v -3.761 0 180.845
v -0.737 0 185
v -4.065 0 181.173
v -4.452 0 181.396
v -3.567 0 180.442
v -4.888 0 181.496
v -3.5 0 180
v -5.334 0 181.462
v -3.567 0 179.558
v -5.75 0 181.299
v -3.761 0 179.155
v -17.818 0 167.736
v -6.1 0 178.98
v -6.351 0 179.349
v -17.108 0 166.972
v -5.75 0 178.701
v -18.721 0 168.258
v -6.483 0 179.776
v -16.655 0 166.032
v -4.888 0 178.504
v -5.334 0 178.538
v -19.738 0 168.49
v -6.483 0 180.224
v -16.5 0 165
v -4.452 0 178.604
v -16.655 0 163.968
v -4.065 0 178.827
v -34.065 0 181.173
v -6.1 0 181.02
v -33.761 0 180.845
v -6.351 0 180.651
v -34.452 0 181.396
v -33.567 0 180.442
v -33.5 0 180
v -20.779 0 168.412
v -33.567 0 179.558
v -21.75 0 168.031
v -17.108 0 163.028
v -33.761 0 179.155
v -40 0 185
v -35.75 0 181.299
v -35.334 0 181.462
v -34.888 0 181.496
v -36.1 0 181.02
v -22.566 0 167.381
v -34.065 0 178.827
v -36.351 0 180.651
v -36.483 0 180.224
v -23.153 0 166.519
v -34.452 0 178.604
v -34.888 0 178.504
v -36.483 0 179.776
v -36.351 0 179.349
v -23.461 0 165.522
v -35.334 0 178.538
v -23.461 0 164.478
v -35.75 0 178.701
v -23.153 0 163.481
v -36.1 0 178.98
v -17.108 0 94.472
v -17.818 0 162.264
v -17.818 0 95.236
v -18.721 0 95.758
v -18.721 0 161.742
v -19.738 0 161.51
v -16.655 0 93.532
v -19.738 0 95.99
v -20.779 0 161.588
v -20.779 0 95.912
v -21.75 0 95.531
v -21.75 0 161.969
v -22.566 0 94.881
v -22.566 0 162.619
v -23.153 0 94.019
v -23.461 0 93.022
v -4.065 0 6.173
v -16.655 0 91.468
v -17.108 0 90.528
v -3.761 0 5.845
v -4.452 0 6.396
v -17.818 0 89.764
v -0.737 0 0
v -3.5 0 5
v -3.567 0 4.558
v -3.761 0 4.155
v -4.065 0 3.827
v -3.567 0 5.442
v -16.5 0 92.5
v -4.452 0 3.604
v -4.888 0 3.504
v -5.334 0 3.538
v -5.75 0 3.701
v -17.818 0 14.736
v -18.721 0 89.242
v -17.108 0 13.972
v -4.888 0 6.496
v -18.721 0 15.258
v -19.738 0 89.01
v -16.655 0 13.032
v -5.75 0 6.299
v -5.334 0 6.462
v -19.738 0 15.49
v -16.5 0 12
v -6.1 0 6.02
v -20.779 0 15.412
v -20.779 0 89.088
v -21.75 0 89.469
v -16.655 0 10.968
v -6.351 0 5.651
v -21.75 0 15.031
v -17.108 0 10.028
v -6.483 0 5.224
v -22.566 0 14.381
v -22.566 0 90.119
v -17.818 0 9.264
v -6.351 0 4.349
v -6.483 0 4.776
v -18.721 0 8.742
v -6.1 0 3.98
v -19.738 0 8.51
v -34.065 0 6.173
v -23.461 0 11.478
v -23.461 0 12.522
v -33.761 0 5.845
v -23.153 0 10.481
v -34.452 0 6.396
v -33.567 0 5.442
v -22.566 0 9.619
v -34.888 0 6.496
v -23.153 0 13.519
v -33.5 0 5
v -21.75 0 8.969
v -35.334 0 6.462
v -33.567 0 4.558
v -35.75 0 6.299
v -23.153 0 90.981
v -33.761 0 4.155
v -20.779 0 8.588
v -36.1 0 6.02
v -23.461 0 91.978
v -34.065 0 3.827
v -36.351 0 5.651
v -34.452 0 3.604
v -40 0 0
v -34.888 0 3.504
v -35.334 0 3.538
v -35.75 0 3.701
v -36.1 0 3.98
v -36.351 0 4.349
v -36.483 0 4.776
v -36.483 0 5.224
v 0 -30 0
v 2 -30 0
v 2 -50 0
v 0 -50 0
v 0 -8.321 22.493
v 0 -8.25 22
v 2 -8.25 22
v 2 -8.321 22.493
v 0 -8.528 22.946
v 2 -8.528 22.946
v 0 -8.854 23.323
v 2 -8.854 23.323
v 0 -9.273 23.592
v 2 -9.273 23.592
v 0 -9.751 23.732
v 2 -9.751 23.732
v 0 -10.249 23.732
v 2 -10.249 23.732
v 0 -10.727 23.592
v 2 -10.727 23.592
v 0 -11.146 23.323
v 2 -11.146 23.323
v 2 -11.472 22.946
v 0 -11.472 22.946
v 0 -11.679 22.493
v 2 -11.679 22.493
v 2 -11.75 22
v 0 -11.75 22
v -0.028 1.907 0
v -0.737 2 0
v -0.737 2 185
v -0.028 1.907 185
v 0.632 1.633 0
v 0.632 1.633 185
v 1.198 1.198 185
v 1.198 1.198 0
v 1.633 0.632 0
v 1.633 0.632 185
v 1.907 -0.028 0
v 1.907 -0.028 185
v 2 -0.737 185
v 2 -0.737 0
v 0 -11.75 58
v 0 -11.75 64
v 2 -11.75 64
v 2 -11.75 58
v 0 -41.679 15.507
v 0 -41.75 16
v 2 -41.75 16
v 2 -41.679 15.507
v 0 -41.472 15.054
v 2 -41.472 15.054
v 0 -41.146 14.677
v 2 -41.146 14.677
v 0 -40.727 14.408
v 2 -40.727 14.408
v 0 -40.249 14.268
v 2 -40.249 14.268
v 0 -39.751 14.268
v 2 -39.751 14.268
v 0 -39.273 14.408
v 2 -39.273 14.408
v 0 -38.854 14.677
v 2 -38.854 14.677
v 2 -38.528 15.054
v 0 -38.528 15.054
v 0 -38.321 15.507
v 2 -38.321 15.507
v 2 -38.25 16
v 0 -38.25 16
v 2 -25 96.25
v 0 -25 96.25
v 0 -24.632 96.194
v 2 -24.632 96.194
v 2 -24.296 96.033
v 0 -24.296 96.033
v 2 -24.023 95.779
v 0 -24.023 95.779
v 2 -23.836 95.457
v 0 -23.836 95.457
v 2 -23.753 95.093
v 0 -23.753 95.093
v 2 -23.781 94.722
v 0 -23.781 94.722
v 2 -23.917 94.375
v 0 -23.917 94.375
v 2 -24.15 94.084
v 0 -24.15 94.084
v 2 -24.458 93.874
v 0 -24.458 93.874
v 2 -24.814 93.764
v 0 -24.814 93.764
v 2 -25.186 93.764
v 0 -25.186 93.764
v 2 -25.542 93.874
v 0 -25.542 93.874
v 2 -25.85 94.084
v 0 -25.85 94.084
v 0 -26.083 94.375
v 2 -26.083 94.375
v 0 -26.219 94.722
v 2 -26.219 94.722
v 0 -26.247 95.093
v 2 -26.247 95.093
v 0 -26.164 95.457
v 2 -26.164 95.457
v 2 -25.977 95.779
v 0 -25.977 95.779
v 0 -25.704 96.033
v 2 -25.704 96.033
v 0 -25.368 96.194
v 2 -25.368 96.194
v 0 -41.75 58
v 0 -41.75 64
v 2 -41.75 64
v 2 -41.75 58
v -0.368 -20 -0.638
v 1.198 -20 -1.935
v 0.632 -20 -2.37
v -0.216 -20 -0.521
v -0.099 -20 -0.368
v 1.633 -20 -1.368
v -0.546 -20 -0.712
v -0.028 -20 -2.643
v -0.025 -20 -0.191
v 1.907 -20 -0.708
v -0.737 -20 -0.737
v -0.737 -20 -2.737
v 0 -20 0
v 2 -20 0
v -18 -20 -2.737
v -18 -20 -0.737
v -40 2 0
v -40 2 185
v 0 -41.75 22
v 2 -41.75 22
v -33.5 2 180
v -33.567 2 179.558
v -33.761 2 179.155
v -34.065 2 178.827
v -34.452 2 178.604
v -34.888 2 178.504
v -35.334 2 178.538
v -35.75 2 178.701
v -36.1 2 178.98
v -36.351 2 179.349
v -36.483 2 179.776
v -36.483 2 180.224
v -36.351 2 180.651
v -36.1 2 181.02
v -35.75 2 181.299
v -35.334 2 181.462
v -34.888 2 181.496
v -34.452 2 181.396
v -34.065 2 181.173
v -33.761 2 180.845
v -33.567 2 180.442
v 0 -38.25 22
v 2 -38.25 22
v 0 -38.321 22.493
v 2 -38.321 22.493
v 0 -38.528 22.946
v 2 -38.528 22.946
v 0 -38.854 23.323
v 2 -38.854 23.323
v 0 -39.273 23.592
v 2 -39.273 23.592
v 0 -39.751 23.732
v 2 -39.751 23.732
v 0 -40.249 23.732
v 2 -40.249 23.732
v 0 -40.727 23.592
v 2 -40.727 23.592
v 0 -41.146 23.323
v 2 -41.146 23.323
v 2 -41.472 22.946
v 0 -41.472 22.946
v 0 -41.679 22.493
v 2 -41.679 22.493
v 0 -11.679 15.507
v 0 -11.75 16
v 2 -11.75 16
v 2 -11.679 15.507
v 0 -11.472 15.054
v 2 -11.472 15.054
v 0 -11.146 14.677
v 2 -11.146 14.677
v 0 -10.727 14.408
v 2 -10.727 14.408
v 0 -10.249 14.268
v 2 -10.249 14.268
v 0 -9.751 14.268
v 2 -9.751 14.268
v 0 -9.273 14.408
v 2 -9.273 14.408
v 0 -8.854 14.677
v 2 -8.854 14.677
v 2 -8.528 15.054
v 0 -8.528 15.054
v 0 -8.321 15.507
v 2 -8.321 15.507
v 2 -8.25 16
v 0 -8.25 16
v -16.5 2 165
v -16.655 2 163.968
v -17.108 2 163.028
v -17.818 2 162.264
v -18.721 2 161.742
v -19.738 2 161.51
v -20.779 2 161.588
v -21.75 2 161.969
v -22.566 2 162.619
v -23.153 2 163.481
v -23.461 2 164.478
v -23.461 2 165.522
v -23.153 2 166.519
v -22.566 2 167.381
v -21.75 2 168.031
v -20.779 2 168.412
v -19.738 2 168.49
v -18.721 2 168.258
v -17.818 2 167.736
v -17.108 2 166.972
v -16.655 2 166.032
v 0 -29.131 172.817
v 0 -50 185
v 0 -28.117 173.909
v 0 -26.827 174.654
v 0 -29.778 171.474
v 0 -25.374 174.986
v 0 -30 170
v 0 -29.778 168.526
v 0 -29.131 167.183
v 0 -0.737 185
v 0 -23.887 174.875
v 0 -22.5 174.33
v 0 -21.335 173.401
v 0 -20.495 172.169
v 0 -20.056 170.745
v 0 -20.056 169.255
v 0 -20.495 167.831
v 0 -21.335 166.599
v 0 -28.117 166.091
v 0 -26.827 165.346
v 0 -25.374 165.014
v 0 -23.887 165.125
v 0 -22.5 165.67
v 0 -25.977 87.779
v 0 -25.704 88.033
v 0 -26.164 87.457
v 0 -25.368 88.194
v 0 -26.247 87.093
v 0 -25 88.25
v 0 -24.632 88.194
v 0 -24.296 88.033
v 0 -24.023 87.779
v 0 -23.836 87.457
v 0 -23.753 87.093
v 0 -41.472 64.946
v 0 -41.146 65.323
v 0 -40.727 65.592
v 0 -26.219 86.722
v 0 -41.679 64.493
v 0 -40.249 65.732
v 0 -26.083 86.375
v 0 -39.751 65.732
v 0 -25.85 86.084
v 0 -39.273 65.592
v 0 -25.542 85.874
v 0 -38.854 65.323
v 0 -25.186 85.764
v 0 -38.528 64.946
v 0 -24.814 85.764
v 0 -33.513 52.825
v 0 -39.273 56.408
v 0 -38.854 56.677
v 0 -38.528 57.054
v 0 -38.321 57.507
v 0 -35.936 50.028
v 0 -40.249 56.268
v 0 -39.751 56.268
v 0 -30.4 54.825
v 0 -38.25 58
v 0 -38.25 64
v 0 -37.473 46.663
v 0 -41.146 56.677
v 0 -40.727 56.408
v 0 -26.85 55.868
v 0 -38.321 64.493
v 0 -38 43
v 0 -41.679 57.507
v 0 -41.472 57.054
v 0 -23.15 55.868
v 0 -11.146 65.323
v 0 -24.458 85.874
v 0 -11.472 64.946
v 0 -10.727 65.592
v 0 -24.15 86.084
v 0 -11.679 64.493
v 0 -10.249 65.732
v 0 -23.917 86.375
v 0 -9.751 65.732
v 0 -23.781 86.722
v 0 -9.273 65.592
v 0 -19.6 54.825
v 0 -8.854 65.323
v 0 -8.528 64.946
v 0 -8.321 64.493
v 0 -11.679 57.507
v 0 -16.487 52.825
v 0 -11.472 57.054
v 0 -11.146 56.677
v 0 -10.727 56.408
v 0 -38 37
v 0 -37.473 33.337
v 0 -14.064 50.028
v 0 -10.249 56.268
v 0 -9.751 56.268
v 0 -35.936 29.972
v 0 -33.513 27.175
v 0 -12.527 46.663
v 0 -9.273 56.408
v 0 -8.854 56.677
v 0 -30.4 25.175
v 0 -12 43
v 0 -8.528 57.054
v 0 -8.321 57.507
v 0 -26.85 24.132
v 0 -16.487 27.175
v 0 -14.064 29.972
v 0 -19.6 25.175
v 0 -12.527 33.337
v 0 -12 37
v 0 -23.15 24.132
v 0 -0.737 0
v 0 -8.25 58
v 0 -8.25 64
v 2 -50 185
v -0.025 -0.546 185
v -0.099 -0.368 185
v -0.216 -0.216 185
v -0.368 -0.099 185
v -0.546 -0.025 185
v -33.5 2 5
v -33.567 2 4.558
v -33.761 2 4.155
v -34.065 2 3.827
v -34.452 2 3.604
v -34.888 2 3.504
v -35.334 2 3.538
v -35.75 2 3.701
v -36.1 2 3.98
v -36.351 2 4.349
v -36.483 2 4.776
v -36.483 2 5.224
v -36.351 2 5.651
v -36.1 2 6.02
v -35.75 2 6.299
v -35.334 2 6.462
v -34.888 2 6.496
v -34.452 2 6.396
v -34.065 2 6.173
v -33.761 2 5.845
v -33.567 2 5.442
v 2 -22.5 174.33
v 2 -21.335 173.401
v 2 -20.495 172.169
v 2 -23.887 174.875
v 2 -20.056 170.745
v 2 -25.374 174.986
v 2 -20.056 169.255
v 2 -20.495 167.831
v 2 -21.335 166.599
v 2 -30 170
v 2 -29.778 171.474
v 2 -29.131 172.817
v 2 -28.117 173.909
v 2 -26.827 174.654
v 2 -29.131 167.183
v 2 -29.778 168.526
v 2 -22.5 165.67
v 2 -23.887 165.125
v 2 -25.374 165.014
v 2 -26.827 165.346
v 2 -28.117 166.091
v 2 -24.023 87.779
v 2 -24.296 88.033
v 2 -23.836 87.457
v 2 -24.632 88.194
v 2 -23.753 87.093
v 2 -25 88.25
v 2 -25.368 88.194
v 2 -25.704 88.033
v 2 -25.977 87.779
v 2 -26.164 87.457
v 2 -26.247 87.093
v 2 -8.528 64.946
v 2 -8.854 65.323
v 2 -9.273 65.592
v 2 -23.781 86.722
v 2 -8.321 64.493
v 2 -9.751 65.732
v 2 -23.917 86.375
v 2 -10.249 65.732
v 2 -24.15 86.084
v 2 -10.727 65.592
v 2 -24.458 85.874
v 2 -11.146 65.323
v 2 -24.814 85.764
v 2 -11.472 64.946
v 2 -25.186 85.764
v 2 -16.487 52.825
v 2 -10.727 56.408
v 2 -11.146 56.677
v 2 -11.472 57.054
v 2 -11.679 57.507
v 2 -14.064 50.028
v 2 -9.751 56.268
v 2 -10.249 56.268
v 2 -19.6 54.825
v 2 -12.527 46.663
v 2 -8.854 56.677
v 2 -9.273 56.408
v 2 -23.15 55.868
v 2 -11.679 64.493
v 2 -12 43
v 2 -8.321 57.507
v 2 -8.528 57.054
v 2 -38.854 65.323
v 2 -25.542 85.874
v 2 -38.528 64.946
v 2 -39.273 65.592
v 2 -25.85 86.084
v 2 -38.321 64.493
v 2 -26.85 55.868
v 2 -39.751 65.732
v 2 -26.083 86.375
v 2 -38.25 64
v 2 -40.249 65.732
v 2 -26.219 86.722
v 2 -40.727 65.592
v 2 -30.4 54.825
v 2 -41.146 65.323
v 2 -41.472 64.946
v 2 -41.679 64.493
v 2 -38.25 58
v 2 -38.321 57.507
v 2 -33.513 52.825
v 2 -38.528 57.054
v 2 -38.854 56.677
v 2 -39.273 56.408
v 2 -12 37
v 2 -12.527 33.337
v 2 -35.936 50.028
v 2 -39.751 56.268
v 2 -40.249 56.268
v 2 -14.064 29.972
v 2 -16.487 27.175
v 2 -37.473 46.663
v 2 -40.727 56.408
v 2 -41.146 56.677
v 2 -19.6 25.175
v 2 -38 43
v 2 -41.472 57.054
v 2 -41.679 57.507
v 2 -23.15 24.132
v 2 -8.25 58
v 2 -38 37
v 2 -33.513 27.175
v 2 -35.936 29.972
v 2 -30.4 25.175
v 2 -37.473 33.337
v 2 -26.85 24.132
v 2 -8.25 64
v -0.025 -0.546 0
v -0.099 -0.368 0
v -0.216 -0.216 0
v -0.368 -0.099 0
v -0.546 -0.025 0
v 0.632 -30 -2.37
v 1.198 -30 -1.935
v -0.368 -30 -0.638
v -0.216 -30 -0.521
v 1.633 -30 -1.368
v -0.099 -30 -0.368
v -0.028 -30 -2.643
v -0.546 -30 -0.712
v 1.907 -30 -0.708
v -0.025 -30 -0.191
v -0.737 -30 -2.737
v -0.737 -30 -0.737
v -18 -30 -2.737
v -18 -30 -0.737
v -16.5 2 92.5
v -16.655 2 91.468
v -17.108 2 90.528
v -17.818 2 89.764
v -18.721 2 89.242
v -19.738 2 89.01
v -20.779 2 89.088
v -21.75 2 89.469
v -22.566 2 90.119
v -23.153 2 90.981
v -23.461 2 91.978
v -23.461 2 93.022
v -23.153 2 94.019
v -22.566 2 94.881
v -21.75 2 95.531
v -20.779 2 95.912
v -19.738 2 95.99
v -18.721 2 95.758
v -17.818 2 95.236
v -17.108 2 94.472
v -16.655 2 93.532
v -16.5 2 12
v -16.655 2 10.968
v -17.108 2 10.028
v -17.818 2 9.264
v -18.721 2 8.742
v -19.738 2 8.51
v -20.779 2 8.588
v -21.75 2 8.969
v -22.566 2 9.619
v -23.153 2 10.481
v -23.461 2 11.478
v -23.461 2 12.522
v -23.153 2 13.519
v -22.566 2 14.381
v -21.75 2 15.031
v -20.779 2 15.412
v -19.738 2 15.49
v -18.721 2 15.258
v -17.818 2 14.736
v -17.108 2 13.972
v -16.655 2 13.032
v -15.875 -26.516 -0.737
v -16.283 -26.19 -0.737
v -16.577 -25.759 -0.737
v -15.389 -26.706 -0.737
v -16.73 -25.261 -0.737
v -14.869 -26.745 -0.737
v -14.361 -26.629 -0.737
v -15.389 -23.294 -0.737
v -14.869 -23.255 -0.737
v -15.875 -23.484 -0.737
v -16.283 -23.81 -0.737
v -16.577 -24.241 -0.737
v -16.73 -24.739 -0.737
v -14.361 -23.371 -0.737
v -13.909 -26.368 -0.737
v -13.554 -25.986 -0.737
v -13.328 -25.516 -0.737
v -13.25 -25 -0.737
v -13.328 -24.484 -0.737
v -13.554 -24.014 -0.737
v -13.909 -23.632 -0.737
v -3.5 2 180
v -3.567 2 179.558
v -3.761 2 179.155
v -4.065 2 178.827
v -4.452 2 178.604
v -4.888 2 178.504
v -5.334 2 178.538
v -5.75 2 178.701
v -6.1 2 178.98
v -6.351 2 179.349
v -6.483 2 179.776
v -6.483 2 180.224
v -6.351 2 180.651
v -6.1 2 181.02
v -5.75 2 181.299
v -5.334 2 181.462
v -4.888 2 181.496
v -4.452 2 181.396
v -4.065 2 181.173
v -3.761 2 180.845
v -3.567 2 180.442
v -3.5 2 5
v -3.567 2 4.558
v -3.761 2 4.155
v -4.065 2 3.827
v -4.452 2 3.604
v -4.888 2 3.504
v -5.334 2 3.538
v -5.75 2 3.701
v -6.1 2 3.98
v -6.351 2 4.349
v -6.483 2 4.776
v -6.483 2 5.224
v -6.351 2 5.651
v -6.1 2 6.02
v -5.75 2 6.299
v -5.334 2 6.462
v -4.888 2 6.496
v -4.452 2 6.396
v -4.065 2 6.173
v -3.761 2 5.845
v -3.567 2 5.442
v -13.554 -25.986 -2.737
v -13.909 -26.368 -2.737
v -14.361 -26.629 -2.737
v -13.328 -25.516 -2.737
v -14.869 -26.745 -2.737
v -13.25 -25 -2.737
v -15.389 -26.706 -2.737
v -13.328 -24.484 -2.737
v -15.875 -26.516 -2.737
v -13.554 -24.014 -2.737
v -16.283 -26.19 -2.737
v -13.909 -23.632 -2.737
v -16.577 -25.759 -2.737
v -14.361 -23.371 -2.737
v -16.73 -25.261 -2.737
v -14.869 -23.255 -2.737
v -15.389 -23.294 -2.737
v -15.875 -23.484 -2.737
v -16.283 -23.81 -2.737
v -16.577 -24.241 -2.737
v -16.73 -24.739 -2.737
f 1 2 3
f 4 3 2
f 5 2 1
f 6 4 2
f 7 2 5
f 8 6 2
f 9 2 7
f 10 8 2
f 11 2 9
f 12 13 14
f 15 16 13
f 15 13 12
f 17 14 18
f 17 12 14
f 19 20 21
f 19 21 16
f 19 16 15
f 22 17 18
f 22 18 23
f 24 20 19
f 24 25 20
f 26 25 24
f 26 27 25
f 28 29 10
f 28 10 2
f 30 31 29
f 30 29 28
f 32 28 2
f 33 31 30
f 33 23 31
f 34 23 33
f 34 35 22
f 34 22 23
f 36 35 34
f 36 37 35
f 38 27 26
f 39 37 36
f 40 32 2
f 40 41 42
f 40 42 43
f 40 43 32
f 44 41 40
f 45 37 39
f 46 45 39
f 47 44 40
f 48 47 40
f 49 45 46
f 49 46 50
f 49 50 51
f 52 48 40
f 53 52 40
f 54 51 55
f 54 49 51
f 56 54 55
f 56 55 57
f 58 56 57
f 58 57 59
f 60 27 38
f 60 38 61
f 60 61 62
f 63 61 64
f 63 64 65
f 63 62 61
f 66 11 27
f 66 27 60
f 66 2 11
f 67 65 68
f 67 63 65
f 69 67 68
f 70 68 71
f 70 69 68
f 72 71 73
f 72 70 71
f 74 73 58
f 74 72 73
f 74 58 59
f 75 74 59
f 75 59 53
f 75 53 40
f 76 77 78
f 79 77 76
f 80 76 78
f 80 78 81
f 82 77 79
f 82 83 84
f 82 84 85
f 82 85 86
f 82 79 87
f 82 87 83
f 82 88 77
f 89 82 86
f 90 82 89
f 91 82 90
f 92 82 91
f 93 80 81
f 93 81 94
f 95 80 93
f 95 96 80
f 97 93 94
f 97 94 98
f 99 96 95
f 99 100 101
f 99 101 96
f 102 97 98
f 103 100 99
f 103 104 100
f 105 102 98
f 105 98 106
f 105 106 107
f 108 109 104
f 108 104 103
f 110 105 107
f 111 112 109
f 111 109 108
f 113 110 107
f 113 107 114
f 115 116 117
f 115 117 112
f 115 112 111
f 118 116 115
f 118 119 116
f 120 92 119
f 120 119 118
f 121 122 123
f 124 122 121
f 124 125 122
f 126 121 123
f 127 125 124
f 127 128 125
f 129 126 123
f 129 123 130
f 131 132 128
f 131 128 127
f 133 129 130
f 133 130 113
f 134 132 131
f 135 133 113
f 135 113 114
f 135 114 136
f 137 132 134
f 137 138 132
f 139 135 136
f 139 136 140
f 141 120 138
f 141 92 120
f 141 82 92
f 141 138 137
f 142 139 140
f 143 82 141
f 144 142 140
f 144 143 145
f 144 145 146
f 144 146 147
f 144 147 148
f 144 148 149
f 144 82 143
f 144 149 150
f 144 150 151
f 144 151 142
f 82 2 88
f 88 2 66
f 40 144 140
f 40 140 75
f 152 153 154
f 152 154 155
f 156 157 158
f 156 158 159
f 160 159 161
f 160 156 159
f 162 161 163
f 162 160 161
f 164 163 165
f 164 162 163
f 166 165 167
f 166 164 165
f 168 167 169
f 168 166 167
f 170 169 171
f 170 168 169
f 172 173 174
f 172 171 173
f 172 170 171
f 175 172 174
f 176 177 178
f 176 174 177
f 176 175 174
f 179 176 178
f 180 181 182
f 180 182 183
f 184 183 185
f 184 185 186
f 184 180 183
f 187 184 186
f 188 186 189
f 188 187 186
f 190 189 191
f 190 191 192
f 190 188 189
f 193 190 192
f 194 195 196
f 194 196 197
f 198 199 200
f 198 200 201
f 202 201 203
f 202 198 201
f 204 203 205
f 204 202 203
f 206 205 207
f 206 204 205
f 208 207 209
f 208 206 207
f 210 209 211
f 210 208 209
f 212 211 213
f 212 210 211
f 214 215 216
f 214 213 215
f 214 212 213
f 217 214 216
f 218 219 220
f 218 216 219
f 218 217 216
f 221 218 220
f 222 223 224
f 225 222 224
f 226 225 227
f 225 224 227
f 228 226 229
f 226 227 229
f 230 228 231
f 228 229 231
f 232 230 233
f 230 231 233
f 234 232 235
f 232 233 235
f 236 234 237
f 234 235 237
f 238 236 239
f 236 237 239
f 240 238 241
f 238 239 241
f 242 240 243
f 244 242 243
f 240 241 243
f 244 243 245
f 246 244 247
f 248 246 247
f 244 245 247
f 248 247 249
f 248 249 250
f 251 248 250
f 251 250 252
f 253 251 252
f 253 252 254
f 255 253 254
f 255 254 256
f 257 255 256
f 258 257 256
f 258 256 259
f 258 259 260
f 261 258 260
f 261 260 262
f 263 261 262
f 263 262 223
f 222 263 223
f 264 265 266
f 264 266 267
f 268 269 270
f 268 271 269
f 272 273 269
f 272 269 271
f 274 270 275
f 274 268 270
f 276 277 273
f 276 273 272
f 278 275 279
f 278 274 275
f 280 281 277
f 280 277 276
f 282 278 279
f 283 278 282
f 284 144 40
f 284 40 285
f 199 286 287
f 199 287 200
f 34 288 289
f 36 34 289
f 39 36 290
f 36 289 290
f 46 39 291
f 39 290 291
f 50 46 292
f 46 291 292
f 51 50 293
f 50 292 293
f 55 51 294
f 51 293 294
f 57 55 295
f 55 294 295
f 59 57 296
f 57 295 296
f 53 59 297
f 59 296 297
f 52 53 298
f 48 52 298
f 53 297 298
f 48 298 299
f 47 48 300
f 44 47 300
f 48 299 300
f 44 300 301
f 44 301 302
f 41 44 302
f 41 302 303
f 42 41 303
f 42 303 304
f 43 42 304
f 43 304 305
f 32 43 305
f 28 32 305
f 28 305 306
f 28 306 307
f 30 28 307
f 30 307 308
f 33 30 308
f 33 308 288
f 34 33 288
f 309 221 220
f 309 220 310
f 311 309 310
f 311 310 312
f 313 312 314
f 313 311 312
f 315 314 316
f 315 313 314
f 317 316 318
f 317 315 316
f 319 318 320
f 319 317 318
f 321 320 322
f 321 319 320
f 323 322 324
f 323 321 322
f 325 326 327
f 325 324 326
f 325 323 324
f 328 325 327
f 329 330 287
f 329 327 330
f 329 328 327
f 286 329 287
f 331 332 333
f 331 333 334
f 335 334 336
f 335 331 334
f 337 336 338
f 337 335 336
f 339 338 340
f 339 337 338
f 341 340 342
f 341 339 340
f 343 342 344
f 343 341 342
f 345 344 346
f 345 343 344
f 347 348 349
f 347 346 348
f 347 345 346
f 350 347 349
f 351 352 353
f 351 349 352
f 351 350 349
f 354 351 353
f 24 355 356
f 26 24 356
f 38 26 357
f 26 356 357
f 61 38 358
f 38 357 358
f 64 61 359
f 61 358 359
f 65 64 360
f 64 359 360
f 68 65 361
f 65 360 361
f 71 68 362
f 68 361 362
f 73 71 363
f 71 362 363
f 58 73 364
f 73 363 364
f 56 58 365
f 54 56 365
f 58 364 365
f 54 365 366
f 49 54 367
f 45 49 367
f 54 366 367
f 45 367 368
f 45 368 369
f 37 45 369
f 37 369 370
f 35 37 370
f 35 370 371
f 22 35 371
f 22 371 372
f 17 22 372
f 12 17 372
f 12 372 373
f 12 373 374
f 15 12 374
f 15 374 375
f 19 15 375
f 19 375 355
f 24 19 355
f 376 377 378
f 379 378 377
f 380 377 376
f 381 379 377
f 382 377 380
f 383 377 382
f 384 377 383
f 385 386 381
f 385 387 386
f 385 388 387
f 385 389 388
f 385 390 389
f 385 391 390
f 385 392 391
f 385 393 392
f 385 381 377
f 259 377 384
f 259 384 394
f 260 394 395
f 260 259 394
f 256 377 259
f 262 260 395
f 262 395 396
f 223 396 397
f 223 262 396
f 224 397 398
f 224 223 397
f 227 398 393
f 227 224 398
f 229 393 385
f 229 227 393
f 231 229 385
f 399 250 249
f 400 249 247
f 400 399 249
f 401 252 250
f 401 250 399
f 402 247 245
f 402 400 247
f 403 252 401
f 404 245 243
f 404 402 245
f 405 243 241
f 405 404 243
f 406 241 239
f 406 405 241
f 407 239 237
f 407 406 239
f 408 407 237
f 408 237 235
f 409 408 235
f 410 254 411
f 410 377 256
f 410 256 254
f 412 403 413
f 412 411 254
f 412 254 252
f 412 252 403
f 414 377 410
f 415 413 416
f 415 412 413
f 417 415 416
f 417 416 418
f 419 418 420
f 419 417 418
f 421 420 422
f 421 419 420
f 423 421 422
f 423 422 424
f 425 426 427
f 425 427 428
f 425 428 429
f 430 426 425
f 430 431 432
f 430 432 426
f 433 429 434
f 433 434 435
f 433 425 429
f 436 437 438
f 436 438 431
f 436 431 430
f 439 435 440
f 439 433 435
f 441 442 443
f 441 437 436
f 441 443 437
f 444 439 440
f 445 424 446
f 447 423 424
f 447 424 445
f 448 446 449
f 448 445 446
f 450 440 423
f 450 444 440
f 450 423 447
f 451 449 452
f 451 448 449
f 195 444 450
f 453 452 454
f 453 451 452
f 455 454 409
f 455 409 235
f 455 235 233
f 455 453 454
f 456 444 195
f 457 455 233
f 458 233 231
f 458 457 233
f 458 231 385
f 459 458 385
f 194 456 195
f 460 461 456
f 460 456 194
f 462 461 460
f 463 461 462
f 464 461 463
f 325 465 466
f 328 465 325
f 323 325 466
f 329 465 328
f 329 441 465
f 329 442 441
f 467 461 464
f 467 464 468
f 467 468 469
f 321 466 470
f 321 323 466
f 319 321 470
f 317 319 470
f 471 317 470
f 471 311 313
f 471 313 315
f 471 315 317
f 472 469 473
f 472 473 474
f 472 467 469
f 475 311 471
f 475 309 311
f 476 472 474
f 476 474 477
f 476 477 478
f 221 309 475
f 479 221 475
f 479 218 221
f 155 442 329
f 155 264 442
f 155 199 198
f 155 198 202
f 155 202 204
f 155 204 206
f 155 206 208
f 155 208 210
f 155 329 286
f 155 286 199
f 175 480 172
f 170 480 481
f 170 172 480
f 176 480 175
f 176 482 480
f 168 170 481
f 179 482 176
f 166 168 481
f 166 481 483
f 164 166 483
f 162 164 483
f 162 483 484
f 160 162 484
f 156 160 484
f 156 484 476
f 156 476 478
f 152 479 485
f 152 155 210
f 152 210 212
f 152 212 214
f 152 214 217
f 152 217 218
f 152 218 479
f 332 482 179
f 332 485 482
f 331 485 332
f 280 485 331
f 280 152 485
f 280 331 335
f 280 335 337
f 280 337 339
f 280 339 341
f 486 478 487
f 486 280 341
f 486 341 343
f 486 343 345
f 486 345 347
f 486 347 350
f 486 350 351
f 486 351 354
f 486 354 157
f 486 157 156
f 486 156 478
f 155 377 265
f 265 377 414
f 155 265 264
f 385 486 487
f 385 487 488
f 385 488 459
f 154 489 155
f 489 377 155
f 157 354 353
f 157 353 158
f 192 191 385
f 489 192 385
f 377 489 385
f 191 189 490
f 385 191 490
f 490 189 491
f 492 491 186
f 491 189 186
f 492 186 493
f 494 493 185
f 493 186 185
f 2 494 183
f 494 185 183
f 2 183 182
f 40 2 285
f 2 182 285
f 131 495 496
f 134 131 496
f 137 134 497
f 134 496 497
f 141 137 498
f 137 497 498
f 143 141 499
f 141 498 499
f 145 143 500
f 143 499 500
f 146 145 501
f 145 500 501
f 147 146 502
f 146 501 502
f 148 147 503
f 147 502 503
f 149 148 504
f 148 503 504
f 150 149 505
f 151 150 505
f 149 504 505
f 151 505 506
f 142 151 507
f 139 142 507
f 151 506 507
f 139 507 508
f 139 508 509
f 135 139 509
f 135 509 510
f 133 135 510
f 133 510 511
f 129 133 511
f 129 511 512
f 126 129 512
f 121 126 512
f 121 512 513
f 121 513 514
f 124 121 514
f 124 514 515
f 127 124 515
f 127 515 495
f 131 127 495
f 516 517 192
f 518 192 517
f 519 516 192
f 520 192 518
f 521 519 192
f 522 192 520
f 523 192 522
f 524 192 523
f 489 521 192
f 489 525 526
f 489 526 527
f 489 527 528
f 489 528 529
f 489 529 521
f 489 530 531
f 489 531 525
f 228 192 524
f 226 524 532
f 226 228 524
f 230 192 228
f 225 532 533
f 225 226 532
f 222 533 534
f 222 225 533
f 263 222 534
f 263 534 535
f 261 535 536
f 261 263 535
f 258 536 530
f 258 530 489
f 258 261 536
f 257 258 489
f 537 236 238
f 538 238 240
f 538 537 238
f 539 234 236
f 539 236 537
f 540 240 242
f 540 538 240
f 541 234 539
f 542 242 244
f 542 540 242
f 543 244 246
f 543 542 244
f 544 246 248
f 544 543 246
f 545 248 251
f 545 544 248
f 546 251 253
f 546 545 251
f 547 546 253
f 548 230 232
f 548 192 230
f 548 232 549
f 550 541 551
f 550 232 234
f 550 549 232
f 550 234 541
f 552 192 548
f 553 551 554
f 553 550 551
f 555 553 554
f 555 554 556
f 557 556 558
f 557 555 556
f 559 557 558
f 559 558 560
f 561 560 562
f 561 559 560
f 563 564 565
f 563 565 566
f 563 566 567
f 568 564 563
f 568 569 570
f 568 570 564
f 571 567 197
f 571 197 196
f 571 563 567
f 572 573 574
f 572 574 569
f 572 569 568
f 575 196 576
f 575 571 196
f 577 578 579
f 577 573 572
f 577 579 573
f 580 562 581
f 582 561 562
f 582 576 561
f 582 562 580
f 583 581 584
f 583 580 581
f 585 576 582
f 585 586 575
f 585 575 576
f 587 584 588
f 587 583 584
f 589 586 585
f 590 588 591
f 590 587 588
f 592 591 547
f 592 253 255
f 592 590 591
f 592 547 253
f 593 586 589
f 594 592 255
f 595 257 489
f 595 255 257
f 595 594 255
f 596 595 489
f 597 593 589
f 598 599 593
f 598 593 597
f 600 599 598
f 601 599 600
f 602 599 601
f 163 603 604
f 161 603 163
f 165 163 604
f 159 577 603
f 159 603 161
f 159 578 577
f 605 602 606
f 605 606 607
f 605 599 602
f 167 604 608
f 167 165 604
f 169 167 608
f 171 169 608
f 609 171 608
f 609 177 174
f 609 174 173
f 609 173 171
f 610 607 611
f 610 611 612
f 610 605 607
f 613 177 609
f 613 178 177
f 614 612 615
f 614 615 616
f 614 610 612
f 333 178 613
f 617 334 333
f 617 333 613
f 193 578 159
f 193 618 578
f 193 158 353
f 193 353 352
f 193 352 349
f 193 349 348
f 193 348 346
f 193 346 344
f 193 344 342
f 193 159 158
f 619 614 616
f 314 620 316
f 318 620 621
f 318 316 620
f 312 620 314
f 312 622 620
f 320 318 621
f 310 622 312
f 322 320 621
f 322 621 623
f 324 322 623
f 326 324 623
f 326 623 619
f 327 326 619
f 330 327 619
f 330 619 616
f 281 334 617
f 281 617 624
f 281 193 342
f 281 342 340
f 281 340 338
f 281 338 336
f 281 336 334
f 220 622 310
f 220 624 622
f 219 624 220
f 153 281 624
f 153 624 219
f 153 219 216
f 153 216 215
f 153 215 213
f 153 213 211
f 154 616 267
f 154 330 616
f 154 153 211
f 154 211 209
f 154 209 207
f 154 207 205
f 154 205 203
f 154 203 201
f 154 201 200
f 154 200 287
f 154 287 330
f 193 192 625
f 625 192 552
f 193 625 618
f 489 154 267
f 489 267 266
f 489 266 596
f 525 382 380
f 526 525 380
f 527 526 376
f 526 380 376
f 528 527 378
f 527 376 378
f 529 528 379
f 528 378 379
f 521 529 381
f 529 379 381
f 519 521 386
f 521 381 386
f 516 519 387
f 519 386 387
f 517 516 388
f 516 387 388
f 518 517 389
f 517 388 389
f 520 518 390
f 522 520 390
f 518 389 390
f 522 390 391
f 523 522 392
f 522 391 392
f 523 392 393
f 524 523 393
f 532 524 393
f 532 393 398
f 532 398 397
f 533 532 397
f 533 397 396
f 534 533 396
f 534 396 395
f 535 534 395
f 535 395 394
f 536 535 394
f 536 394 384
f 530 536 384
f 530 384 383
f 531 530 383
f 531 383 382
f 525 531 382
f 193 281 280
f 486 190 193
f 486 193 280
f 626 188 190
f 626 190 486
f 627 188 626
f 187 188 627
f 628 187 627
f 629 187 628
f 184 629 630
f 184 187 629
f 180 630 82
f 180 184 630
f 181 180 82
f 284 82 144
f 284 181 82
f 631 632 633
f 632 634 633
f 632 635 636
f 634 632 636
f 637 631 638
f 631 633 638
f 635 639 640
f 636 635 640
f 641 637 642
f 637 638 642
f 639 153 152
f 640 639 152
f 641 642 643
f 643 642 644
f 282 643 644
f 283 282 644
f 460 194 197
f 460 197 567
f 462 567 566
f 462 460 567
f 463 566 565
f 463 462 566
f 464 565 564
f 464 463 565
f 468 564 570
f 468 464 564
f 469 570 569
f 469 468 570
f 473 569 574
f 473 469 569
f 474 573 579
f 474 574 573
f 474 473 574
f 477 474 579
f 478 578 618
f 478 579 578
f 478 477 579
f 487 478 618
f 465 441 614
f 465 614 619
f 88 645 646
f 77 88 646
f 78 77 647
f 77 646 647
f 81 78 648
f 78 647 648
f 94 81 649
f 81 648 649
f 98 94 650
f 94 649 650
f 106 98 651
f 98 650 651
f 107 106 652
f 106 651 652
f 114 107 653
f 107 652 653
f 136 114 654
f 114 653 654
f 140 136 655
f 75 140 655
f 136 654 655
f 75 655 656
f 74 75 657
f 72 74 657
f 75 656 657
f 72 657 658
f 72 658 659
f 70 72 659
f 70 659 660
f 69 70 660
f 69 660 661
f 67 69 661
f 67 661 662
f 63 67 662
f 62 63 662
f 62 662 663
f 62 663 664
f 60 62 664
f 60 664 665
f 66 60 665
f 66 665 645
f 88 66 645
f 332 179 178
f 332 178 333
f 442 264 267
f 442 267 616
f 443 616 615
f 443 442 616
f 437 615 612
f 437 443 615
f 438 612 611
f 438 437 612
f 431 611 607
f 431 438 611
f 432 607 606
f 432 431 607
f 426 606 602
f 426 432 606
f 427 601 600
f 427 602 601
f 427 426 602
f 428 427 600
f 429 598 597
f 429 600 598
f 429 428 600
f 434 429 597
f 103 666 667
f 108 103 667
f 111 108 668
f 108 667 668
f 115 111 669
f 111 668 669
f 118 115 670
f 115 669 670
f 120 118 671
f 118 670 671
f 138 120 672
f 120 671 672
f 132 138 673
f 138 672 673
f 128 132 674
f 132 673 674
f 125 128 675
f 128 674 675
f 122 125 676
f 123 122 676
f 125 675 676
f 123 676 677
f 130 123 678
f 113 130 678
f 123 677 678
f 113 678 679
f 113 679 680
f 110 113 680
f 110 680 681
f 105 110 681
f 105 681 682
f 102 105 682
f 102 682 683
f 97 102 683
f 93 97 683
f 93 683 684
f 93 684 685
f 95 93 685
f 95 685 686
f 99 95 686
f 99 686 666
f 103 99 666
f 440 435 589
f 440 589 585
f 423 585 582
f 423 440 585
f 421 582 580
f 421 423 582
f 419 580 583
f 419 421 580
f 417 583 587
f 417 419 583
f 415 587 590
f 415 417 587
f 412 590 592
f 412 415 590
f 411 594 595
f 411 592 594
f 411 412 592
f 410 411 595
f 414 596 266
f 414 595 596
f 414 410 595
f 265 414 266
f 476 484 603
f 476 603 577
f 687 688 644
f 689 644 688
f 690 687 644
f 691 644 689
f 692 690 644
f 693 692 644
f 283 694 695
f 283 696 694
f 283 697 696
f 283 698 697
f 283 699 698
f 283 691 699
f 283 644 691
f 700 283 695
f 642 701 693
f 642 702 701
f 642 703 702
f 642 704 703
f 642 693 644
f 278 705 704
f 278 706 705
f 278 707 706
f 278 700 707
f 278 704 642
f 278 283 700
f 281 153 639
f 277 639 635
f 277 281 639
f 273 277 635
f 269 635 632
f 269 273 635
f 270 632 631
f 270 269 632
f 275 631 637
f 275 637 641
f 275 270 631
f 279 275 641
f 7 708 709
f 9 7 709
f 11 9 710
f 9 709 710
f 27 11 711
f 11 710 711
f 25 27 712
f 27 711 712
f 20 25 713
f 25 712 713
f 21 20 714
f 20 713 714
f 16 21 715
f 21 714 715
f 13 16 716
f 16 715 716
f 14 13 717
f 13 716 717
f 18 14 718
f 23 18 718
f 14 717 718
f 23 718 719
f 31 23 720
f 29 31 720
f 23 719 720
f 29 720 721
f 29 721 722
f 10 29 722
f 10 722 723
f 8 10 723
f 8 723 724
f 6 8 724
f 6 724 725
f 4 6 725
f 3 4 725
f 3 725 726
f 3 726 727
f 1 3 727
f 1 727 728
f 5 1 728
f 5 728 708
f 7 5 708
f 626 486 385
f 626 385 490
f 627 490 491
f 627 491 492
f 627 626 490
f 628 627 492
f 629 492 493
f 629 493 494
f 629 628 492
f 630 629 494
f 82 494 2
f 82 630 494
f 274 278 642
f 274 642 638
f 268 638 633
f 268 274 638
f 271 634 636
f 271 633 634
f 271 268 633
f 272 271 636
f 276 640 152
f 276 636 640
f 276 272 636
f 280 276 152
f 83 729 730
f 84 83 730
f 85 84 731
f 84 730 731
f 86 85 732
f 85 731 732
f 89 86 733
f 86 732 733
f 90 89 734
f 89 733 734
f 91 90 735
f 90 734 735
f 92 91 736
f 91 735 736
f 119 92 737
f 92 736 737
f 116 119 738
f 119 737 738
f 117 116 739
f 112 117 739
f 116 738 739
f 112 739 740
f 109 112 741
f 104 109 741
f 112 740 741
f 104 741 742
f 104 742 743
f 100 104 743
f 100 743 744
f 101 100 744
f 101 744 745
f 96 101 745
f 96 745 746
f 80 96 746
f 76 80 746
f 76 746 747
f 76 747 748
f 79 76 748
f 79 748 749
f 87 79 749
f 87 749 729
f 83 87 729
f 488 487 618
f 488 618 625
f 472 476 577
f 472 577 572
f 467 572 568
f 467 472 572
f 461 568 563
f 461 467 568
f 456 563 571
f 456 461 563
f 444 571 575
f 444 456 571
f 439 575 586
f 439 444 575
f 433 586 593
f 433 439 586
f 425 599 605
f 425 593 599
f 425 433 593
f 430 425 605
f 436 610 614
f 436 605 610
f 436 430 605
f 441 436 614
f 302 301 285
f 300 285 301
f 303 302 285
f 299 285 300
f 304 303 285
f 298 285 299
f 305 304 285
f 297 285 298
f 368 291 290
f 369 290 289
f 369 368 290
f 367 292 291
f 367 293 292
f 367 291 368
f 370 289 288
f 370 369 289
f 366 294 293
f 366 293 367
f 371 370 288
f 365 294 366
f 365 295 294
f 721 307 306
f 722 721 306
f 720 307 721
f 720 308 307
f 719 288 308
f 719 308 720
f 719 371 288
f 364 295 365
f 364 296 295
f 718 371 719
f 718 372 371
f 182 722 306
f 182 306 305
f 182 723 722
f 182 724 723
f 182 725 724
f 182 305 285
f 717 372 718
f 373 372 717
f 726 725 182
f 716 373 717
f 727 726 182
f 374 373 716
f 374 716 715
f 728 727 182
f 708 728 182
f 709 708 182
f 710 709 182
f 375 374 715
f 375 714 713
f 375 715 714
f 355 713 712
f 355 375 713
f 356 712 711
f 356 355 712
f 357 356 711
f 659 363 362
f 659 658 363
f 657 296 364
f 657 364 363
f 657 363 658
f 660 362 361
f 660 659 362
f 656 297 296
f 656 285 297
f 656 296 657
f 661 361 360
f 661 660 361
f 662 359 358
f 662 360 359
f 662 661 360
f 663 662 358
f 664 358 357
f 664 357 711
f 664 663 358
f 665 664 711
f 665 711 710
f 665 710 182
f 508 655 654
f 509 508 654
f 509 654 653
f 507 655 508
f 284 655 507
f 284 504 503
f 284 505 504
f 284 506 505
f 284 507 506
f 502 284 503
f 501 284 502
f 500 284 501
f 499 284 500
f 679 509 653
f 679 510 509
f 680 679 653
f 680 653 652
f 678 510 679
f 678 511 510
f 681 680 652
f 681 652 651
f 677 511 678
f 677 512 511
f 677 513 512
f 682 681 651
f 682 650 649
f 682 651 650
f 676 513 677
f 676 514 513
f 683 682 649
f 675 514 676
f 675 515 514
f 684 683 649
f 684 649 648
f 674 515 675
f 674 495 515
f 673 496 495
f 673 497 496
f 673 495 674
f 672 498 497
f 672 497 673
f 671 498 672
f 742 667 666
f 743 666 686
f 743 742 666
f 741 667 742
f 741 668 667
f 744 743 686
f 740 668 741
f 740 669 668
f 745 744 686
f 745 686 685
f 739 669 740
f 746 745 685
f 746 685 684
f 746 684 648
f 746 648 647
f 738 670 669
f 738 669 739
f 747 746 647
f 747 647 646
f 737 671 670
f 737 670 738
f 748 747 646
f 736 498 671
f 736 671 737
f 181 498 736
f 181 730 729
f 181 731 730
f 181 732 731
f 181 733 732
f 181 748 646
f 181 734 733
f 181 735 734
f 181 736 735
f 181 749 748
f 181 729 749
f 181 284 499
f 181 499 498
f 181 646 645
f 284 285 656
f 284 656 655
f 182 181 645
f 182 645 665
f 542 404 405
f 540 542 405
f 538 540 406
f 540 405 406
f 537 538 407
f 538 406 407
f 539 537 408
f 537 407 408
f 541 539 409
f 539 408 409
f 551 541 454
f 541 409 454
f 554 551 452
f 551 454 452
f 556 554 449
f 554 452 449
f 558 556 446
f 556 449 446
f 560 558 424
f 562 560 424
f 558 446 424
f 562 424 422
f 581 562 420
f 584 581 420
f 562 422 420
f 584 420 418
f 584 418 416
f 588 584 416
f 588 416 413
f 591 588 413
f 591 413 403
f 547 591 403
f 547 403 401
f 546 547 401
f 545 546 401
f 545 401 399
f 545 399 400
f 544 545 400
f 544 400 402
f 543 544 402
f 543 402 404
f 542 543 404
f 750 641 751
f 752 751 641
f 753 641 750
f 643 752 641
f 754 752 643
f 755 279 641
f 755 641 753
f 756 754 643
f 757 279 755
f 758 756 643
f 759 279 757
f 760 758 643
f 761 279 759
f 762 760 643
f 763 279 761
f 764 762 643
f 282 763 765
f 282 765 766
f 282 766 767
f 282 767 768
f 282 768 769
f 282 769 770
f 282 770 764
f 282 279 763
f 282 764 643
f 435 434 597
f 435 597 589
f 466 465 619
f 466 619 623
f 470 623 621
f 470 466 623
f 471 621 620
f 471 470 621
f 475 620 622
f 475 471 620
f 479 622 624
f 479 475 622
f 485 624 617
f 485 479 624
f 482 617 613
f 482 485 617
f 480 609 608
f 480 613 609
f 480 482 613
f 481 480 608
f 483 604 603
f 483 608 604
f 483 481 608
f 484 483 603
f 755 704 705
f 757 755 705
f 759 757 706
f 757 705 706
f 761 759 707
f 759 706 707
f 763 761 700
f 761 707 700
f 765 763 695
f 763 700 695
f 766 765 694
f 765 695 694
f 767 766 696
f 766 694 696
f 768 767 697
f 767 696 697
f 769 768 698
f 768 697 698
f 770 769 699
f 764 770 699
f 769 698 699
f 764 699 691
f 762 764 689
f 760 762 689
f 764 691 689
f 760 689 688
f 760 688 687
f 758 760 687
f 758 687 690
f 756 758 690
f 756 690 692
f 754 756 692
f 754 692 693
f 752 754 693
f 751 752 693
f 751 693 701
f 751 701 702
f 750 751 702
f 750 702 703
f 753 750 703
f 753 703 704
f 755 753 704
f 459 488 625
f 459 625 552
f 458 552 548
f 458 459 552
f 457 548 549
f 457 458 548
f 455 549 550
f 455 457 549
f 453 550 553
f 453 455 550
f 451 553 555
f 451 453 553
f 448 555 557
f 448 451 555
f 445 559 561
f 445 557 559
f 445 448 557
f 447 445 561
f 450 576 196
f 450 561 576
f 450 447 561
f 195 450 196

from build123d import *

# Parameters (mm, degrees)
SM_BASE_FLANGE_1_DEPTH    = 185
CUT_EXTRUDE_1_REACH       = 197.768
SKETCH_6_R                = 5
SM_EDGE_FLANGE_1_DEPTH    = 49.2634
HOLE_WIZARD_M3_2_D        = 3
CUT_EXTRUDE_START         = -2.7366
CUT_EXTRUDE_6_OUTLINE_W   = 21
CUT_EXTRUDE_6_OUTLINE_H   = 20
CUT_EXTRUDE_6_OUTLINE_H_2 = 19.2634
CUT_EXTRUDE_6_DEPTH       = 2.7366
HOLE_WIZARD_3_5_3_5_1_D   = 3.5
HOLE_WIZARD_7_0_7_1_D     = 7
HOLE_WIZARD_7_0_7_1_DEPTH = 6
HOLE_WIZARD_7_0_7_1_TIP   = 2.103012167
M3X0_5_1_D                = 2.5


# Read off the part's stored shape, not the designer's step: 除料-伸長6
# Sheet-metal steps are written as plain solids
with BuildPart() as part:
    # Sketch 1 → 基材-凸緣1 (new body)
    with BuildSketch(Plane.XY):
        with BuildLine():
            Line((0, -50), (0, -0.7366))
            ThreePointArc((0, -0.7366), (-0.215745145, -0.215745145), (-0.7366, 0))
            Line((-0.7366, 0), (-40, 0))
            Line((-40, 0), (-40, 2))
            Line((-40, 2), (-0.7366, 2))
            ThreePointArc((-0.7366, 2), (1.198468417, 1.198468417), (2, -0.7366))
            Line((2, -0.7366), (2, -50))
            Line((2, -50), (0, -50))
        make_face()
    extrude(amount=SM_BASE_FLANGE_1_DEPTH)

    # 草圖6 → 除料-伸長1 (cut, up to next)
    with BuildSketch(Plane.ZY, mode=Mode.PRIVATE) as cut_extrude_1_sk1:
        with Locations(Location((170, -25, 0), (0, 0, 270))):
            Circle(SKETCH_6_R)
    cut_extrude_1_tool1 = extrude(cut_extrude_1_sk1.sketch, amount=-CUT_EXTRUDE_1_REACH, mode=Mode.PRIVATE) & part.part
    # 草圖6 → 除料-伸長1 (cut, up to next)
    with BuildSketch(Plane.ZY, mode=Mode.PRIVATE) as cut_extrude_1_sk2:
        with BuildLine():
            Line((37, -12), (43, -12))
            ThreePointArc((43, -12), (56, -25), (43, -38))
            Line((43, -38), (37, -38))
            ThreePointArc((37, -38), (24, -25), (37, -12))
        make_face()
    cut_extrude_1_tool2 = extrude(cut_extrude_1_sk2.sketch, amount=-CUT_EXTRUDE_1_REACH, mode=Mode.PRIVATE) & part.part
    # 草圖6 → 除料-伸長1 (cut, up to next)
    with BuildSketch(Plane.ZY, mode=Mode.PRIVATE) as cut_extrude_1_sk3:
        with BuildLine():
            Line((58, -8.25), (64, -8.25))
            ThreePointArc((64, -8.25), (65.75, -10), (64, -11.75))
            Line((64, -11.75), (58, -11.75))
            ThreePointArc((58, -11.75), (56.25, -10), (58, -8.25))
        make_face()
    cut_extrude_1_tool3 = extrude(cut_extrude_1_sk3.sketch, amount=-CUT_EXTRUDE_1_REACH, mode=Mode.PRIVATE) & part.part
    # 草圖6 → 除料-伸長1 (cut, up to next)
    with BuildSketch(Plane.ZY, mode=Mode.PRIVATE) as cut_extrude_1_sk4:
        with BuildLine():
            Line((16, -8.25), (22, -8.25))
            ThreePointArc((22, -8.25), (23.75, -10), (22, -11.75))
            Line((22, -11.75), (16, -11.75))
            ThreePointArc((16, -11.75), (14.25, -10), (16, -8.25))
        make_face()
    cut_extrude_1_tool4 = extrude(cut_extrude_1_sk4.sketch, amount=-CUT_EXTRUDE_1_REACH, mode=Mode.PRIVATE) & part.part
    # 草圖6 → 除料-伸長1 (cut, up to next)
    with BuildSketch(Plane.ZY, mode=Mode.PRIVATE) as cut_extrude_1_sk5:
        with BuildLine():
            Line((16, -38.25), (22, -38.25))
            ThreePointArc((22, -38.25), (23.75, -40), (22, -41.75))
            Line((22, -41.75), (16, -41.75))
            ThreePointArc((16, -41.75), (14.25, -40), (16, -38.25))
        make_face()
    cut_extrude_1_tool5 = extrude(cut_extrude_1_sk5.sketch, amount=-CUT_EXTRUDE_1_REACH, mode=Mode.PRIVATE) & part.part
    # 草圖6 → 除料-伸長1 (cut, up to next)
    with BuildSketch(Plane.ZY, mode=Mode.PRIVATE) as cut_extrude_1_sk6:
        with BuildLine():
            Line((58, -38.25), (64, -38.25))
            ThreePointArc((64, -38.25), (65.75, -40), (64, -41.75))
            Line((64, -41.75), (58, -41.75))
            ThreePointArc((58, -41.75), (56.25, -40), (58, -38.25))
        make_face()
    cut_extrude_1_tool6 = extrude(cut_extrude_1_sk6.sketch, amount=-CUT_EXTRUDE_1_REACH, mode=Mode.PRIVATE) & part.part
    add(cut_extrude_1_tool1.solids().sort_by_distance((0, -25, 170))[0], mode=Mode.SUBTRACT)
    add(cut_extrude_1_tool2.solids().sort_by_distance((0, -25, 40))[0], mode=Mode.SUBTRACT)
    add(cut_extrude_1_tool3.solids().sort_by_distance((0, -10, 61))[0], mode=Mode.SUBTRACT)
    add(cut_extrude_1_tool4.solids().sort_by_distance((0, -10, 19))[0], mode=Mode.SUBTRACT)
    add(cut_extrude_1_tool5.solids().sort_by_distance((0, -40, 19))[0], mode=Mode.SUBTRACT)
    add(cut_extrude_1_tool6.solids().sort_by_distance((0, -40, 61))[0], mode=Mode.SUBTRACT)

    # 邊線-凸緣1 section (across the edge) → 邊線-凸緣1 (add)
    with BuildSketch(Plane(origin=(0, -0.7366, -0.7366), x_dir=(0, 0, 1), z_dir=(0, -1, 0))):
        with BuildLine():
            Line((-2, 0.7366), (-2, 18))
            Line((-2, 18), (0, 18))
            Line((0, 18), (0, 0.7366))
            ThreePointArc((0, 0.7366), (0.215745145, 0.215745145), (0.7366, 0))
            Line((0.7366, 0), (0.7366, -2))
            ThreePointArc((0.7366, -2), (-1.198468417, -1.198468417), (-2, 0.7366))
        make_face()
    extrude(amount=SM_EDGE_FLANGE_1_DEPTH)

    # M3 螺紋孔2 (through all)
    with Locations(Plane(origin=(0, 0, 0), x_dir=(-1, 0, 0), z_dir=(0, -1, 0))):
        with Locations((35, -5), (35, -180), (5, -5), (5, -180)):
            Hole(HOLE_WIZARD_M3_2_D / 2)

    # 除料-伸長6 outline → 除料-伸長6 (cut)
    with BuildSketch(Plane(origin=(0, 0, -2.7366), x_dir=(-1, 0, 0), z_dir=(0, 0, -1)).offset(CUT_EXTRUDE_START)):
        with Locations((7.5, -40)):
            Rectangle(CUT_EXTRUDE_6_OUTLINE_W, CUT_EXTRUDE_6_OUTLINE_H)
        with Locations((7.5, -10.3683)):
            Rectangle(CUT_EXTRUDE_6_OUTLINE_W, CUT_EXTRUDE_6_OUTLINE_H_2)
    extrude(amount=CUT_EXTRUDE_6_DEPTH, mode=Mode.SUBTRACT)

    # Ø3.5 (3.5) 直徑孔1 (through all)
    with Locations(Plane(origin=(0, 0, -2.7366), x_dir=(-1, 0, 0), z_dir=(0, 0, -1))):
        with Locations((15, -25)):
            Hole(HOLE_WIZARD_3_5_3_5_1_D / 2)

    # Ø7.0 (7) 直徑孔1
    with Locations(Plane(origin=(0, 0, 0), x_dir=(-1, 0, 0), z_dir=(0, -1, 0))):
        with Locations((20, -165), (20, -92.5), (20, -12)):
            Hole(HOLE_WIZARD_7_0_7_1_D / 2, depth=HOLE_WIZARD_7_0_7_1_DEPTH)
            with Locations((0, 0, -(HOLE_WIZARD_7_0_7_1_DEPTH + HOLE_WIZARD_7_0_7_1_TIP / 2))):  # 118° drill point
                Cone(0, HOLE_WIZARD_7_0_7_1_D / 2, HOLE_WIZARD_7_0_7_1_TIP, mode=Mode.SUBTRACT)

    # M3x0.5 螺紋孔1 (through all)
    with Locations(Plane(origin=(2, 0, 0), x_dir=(0, 0, -1), z_dir=(1, 0, 0))):
        with Locations((-95, -25), (-87, -25)):
            Hole(M3X0_5_1_D / 2)


solid = part.part
